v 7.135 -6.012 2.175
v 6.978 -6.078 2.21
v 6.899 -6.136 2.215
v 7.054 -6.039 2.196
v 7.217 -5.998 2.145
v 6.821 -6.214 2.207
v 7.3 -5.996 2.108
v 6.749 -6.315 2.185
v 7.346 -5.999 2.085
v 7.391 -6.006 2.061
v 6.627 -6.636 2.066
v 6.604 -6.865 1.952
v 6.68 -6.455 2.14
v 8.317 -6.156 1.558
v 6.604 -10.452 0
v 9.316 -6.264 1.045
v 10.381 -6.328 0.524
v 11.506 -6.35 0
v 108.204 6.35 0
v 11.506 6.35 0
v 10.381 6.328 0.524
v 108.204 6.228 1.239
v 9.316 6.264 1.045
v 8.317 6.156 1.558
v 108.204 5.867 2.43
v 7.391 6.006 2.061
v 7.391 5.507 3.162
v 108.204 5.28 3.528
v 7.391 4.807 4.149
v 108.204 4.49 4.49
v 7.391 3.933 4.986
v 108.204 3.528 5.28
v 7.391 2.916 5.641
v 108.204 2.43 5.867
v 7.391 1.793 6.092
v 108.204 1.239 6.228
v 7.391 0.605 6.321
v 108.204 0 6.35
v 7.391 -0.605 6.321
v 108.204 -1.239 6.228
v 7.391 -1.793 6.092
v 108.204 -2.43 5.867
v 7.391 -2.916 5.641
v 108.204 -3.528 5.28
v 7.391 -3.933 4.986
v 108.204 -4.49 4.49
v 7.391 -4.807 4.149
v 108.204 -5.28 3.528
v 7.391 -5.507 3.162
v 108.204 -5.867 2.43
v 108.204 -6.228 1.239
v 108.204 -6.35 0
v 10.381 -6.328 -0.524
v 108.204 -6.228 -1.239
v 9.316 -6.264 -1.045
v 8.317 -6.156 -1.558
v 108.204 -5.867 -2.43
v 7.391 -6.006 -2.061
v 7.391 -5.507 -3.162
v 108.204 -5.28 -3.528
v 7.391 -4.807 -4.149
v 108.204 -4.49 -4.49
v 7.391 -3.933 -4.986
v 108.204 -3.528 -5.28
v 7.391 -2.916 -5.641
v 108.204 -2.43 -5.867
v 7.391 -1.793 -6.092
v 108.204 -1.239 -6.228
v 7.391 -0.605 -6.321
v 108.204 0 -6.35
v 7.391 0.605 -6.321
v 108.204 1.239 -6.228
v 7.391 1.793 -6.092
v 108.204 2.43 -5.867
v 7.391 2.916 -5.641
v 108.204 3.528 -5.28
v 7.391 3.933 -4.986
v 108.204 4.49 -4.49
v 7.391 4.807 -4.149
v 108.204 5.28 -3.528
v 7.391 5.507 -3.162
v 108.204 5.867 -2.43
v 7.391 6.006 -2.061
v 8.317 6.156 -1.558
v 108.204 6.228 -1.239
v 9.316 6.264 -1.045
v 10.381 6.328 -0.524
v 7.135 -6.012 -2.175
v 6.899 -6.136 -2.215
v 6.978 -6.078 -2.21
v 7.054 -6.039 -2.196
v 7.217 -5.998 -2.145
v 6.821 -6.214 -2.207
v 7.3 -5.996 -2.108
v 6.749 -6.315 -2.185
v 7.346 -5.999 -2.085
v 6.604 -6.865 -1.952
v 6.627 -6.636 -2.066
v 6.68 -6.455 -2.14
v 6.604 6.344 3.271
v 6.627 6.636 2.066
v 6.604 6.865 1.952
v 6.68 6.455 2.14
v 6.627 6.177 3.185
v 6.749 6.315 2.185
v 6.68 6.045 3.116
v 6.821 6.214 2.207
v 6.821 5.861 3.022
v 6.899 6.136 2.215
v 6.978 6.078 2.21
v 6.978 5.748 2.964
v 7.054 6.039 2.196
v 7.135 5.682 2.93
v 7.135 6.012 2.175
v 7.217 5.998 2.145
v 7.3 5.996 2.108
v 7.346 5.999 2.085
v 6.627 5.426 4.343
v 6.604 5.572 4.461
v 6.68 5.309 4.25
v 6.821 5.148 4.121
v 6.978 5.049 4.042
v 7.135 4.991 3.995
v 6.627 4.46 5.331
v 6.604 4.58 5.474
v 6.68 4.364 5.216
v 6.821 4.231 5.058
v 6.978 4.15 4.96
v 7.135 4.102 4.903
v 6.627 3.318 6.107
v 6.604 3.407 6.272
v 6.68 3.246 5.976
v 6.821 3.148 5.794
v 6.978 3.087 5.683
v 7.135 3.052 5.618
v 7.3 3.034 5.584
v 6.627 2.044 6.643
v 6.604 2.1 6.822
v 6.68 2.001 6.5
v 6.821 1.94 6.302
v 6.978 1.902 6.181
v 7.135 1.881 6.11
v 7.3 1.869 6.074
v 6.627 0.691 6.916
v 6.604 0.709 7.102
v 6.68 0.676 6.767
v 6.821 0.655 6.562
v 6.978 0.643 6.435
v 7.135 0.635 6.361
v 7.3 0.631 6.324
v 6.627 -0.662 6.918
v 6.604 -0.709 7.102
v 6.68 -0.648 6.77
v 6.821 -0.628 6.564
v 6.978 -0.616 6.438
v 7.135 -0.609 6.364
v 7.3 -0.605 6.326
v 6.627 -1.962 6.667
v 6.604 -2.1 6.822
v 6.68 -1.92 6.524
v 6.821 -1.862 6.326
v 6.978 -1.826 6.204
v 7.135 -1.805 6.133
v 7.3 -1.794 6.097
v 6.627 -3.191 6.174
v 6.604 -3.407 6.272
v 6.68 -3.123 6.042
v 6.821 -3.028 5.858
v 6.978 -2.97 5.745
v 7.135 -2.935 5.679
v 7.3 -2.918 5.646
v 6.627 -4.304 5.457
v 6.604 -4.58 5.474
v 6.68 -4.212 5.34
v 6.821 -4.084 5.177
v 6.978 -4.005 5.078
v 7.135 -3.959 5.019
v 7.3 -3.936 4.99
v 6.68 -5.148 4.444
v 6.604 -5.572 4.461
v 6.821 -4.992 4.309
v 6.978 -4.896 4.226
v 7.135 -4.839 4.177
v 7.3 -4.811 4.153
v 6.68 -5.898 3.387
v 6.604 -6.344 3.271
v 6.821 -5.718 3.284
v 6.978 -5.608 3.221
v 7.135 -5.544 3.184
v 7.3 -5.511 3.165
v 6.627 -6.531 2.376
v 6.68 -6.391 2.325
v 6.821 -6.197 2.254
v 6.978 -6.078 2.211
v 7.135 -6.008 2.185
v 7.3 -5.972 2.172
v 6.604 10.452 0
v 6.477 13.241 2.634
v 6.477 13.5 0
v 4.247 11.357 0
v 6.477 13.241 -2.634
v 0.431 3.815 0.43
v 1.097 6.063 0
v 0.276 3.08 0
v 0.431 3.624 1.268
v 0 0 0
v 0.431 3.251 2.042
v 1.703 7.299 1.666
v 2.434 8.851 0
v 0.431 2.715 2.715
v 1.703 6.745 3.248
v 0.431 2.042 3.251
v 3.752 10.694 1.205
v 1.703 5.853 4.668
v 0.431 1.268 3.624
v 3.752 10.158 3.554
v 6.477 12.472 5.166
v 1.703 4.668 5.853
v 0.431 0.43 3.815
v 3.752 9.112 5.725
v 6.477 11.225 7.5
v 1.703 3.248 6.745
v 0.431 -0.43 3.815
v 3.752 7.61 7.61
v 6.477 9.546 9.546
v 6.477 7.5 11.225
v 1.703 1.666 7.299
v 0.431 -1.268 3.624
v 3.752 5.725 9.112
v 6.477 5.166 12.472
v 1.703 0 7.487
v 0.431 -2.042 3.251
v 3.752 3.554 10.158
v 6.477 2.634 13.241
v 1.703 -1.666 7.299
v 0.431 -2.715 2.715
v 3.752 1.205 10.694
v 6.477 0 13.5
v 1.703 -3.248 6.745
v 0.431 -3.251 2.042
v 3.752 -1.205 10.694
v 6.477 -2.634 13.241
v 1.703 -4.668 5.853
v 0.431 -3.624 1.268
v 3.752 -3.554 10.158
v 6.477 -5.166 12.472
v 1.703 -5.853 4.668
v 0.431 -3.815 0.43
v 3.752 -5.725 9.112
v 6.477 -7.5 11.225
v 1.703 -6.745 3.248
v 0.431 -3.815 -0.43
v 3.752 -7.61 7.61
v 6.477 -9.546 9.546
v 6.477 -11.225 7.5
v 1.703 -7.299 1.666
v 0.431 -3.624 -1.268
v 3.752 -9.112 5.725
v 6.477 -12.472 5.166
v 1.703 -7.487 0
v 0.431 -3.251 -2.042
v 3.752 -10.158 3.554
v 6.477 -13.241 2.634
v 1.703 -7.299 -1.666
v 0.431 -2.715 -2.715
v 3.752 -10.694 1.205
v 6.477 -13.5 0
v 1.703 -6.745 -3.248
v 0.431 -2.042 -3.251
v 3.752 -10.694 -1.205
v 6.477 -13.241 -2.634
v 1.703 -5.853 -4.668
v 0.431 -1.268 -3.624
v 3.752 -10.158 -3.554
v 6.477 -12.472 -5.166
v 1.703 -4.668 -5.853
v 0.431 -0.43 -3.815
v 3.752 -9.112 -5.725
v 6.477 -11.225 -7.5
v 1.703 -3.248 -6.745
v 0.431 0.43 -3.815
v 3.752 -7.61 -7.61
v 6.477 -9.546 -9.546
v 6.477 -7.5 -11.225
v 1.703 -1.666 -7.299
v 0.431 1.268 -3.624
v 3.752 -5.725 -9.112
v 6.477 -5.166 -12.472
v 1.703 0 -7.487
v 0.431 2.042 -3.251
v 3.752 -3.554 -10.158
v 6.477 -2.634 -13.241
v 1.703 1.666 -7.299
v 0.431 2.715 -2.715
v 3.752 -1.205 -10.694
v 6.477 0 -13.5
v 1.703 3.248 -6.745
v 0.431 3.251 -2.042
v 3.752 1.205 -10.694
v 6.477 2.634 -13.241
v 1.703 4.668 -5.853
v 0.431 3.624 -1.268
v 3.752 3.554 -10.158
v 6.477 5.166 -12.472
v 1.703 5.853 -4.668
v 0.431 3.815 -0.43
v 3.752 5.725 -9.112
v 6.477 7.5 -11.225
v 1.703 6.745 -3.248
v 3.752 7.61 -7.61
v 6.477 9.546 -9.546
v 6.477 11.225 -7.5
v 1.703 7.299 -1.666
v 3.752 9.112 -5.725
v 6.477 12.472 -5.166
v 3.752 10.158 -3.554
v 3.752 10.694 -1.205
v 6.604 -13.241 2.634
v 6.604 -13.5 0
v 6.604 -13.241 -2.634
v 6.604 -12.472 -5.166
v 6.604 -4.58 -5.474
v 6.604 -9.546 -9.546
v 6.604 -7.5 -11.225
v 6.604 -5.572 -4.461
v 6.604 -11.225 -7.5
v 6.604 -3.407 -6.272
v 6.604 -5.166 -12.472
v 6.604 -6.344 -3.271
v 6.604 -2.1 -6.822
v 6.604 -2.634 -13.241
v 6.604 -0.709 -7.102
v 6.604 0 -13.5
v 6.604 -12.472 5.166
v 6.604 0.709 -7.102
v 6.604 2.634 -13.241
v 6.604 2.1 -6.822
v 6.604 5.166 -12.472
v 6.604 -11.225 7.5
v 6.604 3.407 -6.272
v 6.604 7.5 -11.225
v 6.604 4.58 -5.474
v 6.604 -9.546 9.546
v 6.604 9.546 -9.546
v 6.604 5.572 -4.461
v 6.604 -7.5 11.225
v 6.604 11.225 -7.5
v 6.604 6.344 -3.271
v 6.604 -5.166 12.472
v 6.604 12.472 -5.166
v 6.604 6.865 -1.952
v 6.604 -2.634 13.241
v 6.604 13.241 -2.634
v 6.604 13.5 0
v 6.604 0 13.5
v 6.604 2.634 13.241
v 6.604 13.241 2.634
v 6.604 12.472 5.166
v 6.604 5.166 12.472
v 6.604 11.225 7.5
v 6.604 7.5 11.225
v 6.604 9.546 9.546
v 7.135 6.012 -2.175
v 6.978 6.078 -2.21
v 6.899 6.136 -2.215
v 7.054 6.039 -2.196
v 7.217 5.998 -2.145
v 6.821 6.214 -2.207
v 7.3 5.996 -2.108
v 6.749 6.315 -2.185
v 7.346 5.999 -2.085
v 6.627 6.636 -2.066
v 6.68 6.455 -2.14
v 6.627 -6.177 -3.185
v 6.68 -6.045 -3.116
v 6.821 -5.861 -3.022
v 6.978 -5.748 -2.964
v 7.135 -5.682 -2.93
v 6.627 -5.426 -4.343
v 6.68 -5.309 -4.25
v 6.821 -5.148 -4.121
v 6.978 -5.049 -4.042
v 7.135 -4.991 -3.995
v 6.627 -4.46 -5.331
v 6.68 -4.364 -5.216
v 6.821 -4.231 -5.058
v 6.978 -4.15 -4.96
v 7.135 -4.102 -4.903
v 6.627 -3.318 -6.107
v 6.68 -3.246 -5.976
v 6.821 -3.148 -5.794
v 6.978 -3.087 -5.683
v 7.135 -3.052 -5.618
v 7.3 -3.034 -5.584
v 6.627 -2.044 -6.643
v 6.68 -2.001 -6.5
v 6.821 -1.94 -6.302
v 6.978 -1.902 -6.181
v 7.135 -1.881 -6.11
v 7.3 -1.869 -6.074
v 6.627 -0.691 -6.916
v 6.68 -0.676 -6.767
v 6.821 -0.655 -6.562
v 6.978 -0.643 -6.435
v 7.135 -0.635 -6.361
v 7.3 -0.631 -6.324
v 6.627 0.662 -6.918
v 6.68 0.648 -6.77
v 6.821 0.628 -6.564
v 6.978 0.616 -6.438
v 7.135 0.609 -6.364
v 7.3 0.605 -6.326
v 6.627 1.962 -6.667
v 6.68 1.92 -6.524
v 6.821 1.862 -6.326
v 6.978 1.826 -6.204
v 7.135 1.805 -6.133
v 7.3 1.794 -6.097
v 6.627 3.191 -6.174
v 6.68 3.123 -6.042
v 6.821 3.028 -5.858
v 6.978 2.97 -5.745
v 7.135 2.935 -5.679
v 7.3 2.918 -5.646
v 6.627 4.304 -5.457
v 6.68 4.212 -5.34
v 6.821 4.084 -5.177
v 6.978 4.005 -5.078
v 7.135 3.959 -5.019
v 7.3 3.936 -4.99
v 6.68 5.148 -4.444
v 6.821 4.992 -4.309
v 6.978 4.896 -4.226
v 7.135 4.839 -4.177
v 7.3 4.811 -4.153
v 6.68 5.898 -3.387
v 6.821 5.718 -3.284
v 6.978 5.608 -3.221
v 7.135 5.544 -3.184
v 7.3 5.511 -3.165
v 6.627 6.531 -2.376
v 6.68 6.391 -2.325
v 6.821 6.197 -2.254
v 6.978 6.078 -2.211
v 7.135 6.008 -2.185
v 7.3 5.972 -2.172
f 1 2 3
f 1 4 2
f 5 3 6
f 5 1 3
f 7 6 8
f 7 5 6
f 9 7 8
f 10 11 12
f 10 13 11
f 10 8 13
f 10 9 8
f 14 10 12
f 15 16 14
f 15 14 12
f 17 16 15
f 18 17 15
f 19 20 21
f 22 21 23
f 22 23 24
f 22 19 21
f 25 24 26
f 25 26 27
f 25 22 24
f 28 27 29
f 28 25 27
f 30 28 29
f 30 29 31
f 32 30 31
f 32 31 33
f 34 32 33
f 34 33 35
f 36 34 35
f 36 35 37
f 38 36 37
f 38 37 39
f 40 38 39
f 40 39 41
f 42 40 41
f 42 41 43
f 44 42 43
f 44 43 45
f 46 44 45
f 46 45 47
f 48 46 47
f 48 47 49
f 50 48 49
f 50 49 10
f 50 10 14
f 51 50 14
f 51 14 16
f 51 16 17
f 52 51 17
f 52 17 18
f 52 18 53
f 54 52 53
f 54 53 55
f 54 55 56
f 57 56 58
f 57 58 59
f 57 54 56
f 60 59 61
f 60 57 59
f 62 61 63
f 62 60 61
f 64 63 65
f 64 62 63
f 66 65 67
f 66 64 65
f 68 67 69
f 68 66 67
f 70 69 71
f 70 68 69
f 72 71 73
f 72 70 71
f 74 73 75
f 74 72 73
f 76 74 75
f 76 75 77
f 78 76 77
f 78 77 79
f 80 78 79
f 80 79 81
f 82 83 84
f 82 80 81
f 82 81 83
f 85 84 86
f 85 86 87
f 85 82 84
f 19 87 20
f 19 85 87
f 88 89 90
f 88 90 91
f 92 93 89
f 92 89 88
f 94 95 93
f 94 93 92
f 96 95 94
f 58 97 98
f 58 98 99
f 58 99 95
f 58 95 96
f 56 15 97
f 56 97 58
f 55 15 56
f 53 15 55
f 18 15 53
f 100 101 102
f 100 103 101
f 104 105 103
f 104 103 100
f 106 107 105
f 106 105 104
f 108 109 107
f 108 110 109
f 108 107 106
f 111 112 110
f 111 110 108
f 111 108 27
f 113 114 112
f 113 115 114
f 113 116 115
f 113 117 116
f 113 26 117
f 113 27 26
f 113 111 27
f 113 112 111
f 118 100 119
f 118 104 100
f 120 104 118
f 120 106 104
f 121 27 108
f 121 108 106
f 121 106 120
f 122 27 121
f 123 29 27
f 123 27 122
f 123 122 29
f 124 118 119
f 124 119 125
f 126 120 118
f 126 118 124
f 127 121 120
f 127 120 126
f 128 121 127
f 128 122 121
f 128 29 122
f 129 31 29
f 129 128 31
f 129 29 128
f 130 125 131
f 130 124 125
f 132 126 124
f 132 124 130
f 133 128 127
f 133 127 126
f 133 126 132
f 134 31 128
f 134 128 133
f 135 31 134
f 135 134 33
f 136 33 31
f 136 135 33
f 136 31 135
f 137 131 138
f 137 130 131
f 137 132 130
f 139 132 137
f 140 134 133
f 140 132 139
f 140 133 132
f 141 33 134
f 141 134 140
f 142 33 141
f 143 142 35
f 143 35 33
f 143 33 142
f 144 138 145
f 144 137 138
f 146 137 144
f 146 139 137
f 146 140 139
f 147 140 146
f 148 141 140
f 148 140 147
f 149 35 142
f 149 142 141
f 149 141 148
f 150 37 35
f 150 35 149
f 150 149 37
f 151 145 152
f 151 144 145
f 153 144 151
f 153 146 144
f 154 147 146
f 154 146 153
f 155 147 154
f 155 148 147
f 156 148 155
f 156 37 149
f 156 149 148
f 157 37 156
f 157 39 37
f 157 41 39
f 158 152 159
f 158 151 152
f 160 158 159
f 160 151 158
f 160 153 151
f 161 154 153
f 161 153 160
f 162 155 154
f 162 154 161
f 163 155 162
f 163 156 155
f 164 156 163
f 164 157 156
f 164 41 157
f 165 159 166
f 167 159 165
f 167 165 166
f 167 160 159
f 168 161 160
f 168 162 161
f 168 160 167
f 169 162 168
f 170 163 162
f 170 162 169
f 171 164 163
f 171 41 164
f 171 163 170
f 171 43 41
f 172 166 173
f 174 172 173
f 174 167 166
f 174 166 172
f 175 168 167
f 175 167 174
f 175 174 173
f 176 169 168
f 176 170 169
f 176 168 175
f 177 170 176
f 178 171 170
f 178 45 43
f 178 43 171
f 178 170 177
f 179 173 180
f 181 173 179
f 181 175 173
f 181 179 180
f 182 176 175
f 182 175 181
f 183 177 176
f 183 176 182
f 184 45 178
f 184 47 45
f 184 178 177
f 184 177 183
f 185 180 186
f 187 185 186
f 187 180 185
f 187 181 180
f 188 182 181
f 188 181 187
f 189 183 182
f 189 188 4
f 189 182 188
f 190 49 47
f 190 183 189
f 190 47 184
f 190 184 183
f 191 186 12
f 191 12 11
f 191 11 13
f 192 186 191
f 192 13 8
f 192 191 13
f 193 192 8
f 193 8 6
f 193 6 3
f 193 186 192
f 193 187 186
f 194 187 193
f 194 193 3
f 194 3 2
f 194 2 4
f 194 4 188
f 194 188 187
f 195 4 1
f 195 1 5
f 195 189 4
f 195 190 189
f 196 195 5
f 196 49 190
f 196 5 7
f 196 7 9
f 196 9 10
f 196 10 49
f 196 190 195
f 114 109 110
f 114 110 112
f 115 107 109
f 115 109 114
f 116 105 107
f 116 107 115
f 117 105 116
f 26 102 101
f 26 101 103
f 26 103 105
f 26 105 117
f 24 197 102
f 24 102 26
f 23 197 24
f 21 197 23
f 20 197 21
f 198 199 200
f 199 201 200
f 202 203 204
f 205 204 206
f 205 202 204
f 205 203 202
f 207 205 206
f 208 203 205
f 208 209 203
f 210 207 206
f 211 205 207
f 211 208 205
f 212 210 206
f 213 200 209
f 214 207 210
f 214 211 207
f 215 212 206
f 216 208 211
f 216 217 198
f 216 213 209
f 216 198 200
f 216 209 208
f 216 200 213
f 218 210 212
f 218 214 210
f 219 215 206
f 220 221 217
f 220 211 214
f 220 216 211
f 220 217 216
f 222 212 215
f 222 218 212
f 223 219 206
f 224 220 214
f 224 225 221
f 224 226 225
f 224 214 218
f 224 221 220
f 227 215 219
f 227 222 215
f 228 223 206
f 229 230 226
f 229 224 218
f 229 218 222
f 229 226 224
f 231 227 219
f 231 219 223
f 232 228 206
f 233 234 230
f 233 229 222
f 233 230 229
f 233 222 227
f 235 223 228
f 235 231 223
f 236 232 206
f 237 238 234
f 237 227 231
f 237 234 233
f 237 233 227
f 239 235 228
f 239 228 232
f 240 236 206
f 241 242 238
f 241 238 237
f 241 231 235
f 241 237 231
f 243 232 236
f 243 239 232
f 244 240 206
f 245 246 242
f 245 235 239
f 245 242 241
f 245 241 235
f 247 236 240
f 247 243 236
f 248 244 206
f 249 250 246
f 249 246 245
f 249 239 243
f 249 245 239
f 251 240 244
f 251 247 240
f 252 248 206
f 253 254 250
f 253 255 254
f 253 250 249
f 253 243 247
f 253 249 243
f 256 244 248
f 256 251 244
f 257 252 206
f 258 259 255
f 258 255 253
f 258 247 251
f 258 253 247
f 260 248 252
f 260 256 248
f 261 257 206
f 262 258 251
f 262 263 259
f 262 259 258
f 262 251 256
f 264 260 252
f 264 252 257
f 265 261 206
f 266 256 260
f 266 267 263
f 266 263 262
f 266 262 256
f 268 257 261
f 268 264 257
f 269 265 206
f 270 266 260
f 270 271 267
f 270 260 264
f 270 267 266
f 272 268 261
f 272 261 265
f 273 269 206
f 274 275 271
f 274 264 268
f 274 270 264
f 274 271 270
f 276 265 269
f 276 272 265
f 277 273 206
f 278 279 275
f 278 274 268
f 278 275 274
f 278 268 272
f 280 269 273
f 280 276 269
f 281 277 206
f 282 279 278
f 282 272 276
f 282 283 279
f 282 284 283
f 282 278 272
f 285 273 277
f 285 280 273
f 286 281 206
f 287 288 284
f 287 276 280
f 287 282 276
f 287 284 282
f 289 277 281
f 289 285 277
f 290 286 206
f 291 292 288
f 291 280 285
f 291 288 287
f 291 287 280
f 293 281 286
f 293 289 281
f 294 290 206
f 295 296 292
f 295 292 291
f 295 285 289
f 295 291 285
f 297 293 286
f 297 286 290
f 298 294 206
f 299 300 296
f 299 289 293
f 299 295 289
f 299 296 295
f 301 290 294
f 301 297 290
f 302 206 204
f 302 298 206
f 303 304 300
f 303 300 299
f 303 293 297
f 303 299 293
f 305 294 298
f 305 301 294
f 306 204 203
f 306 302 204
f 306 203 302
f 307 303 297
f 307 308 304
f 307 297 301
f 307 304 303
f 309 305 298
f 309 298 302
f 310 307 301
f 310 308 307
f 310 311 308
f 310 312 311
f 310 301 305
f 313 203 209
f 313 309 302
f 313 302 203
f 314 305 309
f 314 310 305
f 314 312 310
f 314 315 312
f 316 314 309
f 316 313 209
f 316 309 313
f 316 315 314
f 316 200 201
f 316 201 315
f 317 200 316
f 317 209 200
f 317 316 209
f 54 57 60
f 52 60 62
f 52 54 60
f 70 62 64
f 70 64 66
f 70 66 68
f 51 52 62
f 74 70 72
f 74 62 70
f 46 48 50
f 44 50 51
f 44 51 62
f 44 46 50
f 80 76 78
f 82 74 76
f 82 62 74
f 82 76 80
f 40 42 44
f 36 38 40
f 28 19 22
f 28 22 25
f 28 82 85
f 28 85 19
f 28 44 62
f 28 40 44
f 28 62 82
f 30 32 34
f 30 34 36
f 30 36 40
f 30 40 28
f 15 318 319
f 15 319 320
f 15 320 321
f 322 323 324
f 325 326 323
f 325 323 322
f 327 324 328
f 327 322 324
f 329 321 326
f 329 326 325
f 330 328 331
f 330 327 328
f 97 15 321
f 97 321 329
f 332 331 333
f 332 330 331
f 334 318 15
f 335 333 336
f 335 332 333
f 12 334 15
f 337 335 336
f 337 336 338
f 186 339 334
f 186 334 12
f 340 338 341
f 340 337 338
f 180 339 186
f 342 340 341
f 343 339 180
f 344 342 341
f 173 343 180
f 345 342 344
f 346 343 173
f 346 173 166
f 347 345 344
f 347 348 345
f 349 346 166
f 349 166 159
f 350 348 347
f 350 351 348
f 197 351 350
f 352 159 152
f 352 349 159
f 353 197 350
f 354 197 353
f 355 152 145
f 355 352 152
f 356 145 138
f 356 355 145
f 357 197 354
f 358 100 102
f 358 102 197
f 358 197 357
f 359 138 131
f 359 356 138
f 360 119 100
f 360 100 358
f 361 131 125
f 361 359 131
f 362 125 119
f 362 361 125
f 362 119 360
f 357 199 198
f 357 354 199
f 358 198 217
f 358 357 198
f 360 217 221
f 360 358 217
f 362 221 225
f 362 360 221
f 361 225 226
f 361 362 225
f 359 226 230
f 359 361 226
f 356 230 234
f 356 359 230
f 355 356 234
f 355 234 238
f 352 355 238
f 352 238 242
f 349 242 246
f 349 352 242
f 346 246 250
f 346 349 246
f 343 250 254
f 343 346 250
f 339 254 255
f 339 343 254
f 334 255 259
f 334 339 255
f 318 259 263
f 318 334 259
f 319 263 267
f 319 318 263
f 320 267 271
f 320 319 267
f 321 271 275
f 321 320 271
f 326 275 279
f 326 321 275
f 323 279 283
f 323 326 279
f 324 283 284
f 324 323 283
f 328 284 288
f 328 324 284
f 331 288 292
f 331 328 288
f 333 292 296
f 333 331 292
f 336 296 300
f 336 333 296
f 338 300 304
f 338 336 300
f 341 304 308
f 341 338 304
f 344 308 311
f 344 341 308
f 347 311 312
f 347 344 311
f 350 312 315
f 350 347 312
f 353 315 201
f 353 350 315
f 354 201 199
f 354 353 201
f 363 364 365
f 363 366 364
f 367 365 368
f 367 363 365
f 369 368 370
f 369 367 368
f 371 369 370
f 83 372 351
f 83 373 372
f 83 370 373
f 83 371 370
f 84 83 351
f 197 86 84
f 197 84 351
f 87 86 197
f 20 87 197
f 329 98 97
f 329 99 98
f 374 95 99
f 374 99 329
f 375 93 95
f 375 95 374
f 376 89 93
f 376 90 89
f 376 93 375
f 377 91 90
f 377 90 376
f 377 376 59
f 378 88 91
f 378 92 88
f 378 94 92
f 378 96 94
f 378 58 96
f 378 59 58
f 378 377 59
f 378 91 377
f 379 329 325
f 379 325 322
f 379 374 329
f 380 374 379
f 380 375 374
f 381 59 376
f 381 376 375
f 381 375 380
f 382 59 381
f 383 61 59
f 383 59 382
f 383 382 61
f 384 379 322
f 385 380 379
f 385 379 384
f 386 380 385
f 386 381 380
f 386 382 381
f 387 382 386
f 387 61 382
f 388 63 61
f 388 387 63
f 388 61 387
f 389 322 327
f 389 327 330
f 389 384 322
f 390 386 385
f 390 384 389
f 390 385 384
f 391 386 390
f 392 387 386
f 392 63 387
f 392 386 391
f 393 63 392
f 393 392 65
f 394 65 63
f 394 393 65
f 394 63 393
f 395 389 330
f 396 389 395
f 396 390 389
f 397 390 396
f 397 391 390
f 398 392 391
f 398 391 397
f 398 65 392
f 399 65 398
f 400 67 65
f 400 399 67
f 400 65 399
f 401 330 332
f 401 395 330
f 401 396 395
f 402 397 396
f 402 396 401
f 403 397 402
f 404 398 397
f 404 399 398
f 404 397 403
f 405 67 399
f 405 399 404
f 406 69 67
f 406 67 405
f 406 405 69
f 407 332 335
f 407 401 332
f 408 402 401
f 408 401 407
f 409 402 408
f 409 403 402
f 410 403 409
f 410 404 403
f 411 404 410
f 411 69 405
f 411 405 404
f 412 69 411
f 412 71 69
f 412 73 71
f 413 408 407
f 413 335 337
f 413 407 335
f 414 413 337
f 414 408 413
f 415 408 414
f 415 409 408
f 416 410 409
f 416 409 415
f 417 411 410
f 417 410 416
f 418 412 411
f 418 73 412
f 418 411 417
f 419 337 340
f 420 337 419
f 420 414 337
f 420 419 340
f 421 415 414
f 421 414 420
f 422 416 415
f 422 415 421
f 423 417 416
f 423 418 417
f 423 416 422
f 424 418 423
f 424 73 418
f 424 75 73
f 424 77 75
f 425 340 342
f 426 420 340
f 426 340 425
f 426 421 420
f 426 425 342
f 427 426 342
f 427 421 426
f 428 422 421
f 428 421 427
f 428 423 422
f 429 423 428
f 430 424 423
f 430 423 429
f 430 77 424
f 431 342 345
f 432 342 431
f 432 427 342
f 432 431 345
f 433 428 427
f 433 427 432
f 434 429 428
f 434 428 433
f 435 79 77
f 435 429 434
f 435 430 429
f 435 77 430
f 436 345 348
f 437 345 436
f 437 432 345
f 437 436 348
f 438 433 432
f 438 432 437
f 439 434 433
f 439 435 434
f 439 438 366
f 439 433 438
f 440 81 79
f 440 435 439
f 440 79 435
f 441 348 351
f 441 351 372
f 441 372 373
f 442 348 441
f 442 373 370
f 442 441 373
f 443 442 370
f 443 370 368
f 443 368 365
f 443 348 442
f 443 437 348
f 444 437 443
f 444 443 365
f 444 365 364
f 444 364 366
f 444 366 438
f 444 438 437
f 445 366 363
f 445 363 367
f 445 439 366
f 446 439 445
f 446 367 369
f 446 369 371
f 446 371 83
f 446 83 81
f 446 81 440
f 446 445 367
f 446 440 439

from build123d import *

# Parameters (mm, degrees)
CIRPATTERN1_COUNT = 2


with BuildPart() as part:
    # ThreadSchematic: read off the stored shape, not the designer's step
    # ThreadSchematic outline → ThreadSchematic (revolve)
    with BuildSketch(Plane.YX):
        with BuildLine():
            Line((0, 108.204), (0, 0))
            ThreePointArc((0, 0), (7.486725405, 1.703037349), (13.500100004, 6.477000005))
            Line((13.500100004, 6.477000005), (13.5001, 6.604))
            Line((13.5001, 6.604), (7.1374, 6.604))
            ThreePointArc((7.1374, 6.604), (6.58062412, 6.83462412), (6.35, 7.3914))
            Line((6.35, 7.3914), (6.35, 108.204))
            Line((6.35, 108.204), (0, 108.204))
        make_face()
    revolve(axis=Axis((0, 0, 0), (1, 0, 0)))

    # Boss-Sweep2: sweep along a path in Sketch3
    with BuildLine(Plane.XY) as boss_sweep2_path:
        Line((6.604, 10.4521), (11.5062, 6.35))
    # Sketch4 → Boss-Sweep2 (sweep)
    with BuildSketch(Plane(origin=(6.604, 0, 0), x_dir=(0, 0, -1), z_dir=(1, 0, 0))):
        Polygon((0, 10.4521), (-2.5146, 5.830890742), (2.5146, 5.830890742), align=None)
    boss_sweep2 = sweep(path=boss_sweep2_path.line)

    # CirPattern1: Boss-Sweep2 ×2 about axis
    cirpattern1_axis = Axis((0, 0, 0), (1, 0, 0))
    for i in range(1, CIRPATTERN1_COUNT):
        add(boss_sweep2.rotate(cirpattern1_axis, i * 360 / CIRPATTERN1_COUNT))


solid = part.part
